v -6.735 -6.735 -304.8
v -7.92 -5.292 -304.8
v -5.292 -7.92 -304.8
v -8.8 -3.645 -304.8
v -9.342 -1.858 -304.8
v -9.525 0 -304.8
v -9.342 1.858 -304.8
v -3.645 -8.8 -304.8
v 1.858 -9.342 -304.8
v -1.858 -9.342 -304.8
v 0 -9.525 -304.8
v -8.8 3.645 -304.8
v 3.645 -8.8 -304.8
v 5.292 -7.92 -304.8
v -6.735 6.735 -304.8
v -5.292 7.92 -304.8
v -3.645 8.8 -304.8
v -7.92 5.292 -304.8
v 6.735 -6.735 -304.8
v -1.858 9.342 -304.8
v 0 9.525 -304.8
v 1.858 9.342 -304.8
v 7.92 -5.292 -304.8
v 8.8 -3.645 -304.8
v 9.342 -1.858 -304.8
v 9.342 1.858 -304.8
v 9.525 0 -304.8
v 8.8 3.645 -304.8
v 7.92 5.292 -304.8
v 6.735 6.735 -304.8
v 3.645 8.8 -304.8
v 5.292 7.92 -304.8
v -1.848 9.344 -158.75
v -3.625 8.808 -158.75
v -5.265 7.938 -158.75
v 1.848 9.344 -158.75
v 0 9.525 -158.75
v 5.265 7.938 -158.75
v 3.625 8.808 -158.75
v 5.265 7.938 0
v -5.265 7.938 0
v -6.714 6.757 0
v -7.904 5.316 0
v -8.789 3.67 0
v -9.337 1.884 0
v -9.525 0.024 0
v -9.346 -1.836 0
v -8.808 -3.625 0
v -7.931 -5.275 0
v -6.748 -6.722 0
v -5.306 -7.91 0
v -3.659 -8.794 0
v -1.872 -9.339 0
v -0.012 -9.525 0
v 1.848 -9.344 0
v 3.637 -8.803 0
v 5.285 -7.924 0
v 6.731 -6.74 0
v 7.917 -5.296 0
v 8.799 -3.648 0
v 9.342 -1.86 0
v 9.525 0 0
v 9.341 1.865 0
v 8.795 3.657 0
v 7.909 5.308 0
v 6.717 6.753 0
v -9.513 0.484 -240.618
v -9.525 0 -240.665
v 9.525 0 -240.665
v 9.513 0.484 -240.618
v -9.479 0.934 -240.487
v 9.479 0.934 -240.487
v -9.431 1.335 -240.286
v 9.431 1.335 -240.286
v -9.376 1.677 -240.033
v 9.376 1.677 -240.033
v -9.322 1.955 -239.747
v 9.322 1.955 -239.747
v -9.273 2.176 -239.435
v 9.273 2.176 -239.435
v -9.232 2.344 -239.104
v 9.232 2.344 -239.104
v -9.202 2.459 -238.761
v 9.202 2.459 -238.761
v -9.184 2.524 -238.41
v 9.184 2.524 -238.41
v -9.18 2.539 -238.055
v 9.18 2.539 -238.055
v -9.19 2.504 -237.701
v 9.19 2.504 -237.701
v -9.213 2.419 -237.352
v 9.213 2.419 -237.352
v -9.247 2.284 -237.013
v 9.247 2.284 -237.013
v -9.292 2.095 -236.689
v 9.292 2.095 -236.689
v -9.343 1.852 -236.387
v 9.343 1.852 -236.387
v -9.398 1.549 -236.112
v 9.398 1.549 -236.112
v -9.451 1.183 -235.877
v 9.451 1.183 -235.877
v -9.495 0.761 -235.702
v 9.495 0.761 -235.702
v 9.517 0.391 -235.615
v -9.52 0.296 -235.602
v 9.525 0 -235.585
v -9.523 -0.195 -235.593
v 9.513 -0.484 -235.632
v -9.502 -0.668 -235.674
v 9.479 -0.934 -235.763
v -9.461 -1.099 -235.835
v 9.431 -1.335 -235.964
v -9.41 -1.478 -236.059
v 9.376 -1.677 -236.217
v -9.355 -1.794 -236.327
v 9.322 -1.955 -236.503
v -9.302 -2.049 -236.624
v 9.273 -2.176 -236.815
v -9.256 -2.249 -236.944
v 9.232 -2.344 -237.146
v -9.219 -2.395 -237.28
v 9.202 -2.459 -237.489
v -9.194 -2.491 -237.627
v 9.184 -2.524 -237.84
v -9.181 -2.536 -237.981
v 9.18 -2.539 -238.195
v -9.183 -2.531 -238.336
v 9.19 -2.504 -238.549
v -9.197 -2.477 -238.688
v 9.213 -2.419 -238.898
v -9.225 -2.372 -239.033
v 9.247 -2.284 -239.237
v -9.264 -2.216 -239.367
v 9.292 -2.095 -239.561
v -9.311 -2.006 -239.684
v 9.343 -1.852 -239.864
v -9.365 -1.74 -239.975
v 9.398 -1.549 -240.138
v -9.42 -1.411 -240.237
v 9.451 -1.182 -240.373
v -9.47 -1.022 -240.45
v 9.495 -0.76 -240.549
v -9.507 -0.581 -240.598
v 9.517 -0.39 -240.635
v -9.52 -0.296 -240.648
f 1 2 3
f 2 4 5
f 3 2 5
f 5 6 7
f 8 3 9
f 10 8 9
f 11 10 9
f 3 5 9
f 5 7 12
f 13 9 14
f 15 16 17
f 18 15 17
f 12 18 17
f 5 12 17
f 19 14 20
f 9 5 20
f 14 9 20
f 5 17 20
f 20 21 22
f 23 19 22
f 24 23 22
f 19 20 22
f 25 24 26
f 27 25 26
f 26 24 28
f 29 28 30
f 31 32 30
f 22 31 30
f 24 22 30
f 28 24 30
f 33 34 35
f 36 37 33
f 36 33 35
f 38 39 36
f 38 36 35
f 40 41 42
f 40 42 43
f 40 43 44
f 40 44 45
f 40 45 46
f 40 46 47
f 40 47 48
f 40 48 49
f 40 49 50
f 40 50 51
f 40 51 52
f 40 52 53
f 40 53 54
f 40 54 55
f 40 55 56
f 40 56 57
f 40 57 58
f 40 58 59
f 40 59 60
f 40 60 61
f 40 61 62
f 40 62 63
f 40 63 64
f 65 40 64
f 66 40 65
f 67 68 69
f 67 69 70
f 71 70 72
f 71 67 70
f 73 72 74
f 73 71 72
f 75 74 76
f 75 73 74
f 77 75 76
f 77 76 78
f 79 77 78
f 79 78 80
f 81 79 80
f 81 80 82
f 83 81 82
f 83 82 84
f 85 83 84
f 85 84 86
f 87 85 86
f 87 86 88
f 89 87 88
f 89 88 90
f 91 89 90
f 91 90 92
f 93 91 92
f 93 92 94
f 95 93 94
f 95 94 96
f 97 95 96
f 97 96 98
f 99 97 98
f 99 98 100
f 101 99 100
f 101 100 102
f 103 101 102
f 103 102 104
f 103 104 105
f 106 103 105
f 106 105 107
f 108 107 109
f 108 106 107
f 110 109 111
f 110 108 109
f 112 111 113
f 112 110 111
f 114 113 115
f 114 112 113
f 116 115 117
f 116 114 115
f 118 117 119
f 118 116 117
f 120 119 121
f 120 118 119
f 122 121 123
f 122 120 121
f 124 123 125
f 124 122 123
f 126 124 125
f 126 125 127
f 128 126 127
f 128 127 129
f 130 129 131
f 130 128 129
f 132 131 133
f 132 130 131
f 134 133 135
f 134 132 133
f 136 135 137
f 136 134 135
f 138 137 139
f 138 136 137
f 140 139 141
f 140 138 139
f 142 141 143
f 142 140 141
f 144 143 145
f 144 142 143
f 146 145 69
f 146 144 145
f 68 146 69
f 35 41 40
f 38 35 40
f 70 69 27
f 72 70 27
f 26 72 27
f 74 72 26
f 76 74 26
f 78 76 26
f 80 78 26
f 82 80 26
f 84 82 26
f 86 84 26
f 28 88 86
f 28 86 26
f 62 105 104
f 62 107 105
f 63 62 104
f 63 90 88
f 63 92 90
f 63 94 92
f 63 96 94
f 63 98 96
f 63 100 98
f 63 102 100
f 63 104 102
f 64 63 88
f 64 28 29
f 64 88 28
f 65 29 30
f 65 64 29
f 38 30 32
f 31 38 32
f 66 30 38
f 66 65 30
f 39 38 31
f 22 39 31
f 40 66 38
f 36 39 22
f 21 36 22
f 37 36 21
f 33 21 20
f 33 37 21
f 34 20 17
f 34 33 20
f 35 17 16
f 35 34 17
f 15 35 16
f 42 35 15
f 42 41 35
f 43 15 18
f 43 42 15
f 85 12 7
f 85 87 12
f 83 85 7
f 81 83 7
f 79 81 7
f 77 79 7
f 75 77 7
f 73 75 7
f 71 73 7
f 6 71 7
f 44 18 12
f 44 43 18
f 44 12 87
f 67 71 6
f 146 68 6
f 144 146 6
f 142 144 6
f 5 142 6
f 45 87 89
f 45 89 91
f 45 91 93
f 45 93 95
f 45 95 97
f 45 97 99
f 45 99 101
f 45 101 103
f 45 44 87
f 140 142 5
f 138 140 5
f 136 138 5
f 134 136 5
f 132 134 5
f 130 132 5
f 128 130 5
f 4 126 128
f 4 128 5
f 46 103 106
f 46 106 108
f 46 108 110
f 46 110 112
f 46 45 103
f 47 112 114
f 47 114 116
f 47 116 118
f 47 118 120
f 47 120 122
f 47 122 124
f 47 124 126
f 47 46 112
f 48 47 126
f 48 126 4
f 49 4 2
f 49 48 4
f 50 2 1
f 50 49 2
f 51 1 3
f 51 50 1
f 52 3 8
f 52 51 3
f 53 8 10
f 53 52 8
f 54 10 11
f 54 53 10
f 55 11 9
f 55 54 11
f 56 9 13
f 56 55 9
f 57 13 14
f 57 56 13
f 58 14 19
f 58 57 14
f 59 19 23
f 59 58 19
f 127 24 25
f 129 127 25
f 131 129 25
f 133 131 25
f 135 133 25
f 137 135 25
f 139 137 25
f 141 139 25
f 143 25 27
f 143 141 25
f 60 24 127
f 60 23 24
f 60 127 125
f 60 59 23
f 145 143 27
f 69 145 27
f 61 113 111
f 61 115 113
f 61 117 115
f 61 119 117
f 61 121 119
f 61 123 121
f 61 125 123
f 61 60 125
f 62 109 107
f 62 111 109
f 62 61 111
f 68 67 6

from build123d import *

# Parameters (mm, degrees)
SKETCH1_R               = 9.525
BOSS_EXTRUDE1_DEPTH     = 304.8
SKETCH3_W               = 23.44415324
SKETCH3_H               = 6.388604027
CUT_EXTRUDE1_DEPTH      = 158.75
CUT_EXTRUDE2_DEPTH      = 306.097511052
CUT_EXTRUDE2_DEPTH_BACK = 306.097511052
SKETCH8_R               = 2.54


with BuildPart() as part:
    # Sketch1 → Boss-Extrude1 (new body)
    with BuildSketch(Plane.XY):
        Circle(SKETCH1_R)
    extrude(amount=-BOSS_EXTRUDE1_DEPTH)

    # Sketch3 → Cut-Extrude1 (cut)
    with BuildSketch(Plane.XY):
        with Locations((0.072269276, 11.131802014)):
            Rectangle(SKETCH3_W, SKETCH3_H)
    extrude(amount=-CUT_EXTRUDE1_DEPTH, mode=Mode.SUBTRACT)

    # Sketch8 → Cut-Extrude2 (cut, two sides: drawn at the far end of the back side and taken through both)
    with BuildSketch(Plane(origin=(0, 0, 0), x_dir=(0, 0, -1), z_dir=(1, 0, 0)).offset(-CUT_EXTRUDE2_DEPTH_BACK)):
        with Locations((238.125, 0)):
            Circle(SKETCH8_R)
    extrude(amount=CUT_EXTRUDE2_DEPTH + CUT_EXTRUDE2_DEPTH_BACK, mode=Mode.SUBTRACT)


solid = part.part
